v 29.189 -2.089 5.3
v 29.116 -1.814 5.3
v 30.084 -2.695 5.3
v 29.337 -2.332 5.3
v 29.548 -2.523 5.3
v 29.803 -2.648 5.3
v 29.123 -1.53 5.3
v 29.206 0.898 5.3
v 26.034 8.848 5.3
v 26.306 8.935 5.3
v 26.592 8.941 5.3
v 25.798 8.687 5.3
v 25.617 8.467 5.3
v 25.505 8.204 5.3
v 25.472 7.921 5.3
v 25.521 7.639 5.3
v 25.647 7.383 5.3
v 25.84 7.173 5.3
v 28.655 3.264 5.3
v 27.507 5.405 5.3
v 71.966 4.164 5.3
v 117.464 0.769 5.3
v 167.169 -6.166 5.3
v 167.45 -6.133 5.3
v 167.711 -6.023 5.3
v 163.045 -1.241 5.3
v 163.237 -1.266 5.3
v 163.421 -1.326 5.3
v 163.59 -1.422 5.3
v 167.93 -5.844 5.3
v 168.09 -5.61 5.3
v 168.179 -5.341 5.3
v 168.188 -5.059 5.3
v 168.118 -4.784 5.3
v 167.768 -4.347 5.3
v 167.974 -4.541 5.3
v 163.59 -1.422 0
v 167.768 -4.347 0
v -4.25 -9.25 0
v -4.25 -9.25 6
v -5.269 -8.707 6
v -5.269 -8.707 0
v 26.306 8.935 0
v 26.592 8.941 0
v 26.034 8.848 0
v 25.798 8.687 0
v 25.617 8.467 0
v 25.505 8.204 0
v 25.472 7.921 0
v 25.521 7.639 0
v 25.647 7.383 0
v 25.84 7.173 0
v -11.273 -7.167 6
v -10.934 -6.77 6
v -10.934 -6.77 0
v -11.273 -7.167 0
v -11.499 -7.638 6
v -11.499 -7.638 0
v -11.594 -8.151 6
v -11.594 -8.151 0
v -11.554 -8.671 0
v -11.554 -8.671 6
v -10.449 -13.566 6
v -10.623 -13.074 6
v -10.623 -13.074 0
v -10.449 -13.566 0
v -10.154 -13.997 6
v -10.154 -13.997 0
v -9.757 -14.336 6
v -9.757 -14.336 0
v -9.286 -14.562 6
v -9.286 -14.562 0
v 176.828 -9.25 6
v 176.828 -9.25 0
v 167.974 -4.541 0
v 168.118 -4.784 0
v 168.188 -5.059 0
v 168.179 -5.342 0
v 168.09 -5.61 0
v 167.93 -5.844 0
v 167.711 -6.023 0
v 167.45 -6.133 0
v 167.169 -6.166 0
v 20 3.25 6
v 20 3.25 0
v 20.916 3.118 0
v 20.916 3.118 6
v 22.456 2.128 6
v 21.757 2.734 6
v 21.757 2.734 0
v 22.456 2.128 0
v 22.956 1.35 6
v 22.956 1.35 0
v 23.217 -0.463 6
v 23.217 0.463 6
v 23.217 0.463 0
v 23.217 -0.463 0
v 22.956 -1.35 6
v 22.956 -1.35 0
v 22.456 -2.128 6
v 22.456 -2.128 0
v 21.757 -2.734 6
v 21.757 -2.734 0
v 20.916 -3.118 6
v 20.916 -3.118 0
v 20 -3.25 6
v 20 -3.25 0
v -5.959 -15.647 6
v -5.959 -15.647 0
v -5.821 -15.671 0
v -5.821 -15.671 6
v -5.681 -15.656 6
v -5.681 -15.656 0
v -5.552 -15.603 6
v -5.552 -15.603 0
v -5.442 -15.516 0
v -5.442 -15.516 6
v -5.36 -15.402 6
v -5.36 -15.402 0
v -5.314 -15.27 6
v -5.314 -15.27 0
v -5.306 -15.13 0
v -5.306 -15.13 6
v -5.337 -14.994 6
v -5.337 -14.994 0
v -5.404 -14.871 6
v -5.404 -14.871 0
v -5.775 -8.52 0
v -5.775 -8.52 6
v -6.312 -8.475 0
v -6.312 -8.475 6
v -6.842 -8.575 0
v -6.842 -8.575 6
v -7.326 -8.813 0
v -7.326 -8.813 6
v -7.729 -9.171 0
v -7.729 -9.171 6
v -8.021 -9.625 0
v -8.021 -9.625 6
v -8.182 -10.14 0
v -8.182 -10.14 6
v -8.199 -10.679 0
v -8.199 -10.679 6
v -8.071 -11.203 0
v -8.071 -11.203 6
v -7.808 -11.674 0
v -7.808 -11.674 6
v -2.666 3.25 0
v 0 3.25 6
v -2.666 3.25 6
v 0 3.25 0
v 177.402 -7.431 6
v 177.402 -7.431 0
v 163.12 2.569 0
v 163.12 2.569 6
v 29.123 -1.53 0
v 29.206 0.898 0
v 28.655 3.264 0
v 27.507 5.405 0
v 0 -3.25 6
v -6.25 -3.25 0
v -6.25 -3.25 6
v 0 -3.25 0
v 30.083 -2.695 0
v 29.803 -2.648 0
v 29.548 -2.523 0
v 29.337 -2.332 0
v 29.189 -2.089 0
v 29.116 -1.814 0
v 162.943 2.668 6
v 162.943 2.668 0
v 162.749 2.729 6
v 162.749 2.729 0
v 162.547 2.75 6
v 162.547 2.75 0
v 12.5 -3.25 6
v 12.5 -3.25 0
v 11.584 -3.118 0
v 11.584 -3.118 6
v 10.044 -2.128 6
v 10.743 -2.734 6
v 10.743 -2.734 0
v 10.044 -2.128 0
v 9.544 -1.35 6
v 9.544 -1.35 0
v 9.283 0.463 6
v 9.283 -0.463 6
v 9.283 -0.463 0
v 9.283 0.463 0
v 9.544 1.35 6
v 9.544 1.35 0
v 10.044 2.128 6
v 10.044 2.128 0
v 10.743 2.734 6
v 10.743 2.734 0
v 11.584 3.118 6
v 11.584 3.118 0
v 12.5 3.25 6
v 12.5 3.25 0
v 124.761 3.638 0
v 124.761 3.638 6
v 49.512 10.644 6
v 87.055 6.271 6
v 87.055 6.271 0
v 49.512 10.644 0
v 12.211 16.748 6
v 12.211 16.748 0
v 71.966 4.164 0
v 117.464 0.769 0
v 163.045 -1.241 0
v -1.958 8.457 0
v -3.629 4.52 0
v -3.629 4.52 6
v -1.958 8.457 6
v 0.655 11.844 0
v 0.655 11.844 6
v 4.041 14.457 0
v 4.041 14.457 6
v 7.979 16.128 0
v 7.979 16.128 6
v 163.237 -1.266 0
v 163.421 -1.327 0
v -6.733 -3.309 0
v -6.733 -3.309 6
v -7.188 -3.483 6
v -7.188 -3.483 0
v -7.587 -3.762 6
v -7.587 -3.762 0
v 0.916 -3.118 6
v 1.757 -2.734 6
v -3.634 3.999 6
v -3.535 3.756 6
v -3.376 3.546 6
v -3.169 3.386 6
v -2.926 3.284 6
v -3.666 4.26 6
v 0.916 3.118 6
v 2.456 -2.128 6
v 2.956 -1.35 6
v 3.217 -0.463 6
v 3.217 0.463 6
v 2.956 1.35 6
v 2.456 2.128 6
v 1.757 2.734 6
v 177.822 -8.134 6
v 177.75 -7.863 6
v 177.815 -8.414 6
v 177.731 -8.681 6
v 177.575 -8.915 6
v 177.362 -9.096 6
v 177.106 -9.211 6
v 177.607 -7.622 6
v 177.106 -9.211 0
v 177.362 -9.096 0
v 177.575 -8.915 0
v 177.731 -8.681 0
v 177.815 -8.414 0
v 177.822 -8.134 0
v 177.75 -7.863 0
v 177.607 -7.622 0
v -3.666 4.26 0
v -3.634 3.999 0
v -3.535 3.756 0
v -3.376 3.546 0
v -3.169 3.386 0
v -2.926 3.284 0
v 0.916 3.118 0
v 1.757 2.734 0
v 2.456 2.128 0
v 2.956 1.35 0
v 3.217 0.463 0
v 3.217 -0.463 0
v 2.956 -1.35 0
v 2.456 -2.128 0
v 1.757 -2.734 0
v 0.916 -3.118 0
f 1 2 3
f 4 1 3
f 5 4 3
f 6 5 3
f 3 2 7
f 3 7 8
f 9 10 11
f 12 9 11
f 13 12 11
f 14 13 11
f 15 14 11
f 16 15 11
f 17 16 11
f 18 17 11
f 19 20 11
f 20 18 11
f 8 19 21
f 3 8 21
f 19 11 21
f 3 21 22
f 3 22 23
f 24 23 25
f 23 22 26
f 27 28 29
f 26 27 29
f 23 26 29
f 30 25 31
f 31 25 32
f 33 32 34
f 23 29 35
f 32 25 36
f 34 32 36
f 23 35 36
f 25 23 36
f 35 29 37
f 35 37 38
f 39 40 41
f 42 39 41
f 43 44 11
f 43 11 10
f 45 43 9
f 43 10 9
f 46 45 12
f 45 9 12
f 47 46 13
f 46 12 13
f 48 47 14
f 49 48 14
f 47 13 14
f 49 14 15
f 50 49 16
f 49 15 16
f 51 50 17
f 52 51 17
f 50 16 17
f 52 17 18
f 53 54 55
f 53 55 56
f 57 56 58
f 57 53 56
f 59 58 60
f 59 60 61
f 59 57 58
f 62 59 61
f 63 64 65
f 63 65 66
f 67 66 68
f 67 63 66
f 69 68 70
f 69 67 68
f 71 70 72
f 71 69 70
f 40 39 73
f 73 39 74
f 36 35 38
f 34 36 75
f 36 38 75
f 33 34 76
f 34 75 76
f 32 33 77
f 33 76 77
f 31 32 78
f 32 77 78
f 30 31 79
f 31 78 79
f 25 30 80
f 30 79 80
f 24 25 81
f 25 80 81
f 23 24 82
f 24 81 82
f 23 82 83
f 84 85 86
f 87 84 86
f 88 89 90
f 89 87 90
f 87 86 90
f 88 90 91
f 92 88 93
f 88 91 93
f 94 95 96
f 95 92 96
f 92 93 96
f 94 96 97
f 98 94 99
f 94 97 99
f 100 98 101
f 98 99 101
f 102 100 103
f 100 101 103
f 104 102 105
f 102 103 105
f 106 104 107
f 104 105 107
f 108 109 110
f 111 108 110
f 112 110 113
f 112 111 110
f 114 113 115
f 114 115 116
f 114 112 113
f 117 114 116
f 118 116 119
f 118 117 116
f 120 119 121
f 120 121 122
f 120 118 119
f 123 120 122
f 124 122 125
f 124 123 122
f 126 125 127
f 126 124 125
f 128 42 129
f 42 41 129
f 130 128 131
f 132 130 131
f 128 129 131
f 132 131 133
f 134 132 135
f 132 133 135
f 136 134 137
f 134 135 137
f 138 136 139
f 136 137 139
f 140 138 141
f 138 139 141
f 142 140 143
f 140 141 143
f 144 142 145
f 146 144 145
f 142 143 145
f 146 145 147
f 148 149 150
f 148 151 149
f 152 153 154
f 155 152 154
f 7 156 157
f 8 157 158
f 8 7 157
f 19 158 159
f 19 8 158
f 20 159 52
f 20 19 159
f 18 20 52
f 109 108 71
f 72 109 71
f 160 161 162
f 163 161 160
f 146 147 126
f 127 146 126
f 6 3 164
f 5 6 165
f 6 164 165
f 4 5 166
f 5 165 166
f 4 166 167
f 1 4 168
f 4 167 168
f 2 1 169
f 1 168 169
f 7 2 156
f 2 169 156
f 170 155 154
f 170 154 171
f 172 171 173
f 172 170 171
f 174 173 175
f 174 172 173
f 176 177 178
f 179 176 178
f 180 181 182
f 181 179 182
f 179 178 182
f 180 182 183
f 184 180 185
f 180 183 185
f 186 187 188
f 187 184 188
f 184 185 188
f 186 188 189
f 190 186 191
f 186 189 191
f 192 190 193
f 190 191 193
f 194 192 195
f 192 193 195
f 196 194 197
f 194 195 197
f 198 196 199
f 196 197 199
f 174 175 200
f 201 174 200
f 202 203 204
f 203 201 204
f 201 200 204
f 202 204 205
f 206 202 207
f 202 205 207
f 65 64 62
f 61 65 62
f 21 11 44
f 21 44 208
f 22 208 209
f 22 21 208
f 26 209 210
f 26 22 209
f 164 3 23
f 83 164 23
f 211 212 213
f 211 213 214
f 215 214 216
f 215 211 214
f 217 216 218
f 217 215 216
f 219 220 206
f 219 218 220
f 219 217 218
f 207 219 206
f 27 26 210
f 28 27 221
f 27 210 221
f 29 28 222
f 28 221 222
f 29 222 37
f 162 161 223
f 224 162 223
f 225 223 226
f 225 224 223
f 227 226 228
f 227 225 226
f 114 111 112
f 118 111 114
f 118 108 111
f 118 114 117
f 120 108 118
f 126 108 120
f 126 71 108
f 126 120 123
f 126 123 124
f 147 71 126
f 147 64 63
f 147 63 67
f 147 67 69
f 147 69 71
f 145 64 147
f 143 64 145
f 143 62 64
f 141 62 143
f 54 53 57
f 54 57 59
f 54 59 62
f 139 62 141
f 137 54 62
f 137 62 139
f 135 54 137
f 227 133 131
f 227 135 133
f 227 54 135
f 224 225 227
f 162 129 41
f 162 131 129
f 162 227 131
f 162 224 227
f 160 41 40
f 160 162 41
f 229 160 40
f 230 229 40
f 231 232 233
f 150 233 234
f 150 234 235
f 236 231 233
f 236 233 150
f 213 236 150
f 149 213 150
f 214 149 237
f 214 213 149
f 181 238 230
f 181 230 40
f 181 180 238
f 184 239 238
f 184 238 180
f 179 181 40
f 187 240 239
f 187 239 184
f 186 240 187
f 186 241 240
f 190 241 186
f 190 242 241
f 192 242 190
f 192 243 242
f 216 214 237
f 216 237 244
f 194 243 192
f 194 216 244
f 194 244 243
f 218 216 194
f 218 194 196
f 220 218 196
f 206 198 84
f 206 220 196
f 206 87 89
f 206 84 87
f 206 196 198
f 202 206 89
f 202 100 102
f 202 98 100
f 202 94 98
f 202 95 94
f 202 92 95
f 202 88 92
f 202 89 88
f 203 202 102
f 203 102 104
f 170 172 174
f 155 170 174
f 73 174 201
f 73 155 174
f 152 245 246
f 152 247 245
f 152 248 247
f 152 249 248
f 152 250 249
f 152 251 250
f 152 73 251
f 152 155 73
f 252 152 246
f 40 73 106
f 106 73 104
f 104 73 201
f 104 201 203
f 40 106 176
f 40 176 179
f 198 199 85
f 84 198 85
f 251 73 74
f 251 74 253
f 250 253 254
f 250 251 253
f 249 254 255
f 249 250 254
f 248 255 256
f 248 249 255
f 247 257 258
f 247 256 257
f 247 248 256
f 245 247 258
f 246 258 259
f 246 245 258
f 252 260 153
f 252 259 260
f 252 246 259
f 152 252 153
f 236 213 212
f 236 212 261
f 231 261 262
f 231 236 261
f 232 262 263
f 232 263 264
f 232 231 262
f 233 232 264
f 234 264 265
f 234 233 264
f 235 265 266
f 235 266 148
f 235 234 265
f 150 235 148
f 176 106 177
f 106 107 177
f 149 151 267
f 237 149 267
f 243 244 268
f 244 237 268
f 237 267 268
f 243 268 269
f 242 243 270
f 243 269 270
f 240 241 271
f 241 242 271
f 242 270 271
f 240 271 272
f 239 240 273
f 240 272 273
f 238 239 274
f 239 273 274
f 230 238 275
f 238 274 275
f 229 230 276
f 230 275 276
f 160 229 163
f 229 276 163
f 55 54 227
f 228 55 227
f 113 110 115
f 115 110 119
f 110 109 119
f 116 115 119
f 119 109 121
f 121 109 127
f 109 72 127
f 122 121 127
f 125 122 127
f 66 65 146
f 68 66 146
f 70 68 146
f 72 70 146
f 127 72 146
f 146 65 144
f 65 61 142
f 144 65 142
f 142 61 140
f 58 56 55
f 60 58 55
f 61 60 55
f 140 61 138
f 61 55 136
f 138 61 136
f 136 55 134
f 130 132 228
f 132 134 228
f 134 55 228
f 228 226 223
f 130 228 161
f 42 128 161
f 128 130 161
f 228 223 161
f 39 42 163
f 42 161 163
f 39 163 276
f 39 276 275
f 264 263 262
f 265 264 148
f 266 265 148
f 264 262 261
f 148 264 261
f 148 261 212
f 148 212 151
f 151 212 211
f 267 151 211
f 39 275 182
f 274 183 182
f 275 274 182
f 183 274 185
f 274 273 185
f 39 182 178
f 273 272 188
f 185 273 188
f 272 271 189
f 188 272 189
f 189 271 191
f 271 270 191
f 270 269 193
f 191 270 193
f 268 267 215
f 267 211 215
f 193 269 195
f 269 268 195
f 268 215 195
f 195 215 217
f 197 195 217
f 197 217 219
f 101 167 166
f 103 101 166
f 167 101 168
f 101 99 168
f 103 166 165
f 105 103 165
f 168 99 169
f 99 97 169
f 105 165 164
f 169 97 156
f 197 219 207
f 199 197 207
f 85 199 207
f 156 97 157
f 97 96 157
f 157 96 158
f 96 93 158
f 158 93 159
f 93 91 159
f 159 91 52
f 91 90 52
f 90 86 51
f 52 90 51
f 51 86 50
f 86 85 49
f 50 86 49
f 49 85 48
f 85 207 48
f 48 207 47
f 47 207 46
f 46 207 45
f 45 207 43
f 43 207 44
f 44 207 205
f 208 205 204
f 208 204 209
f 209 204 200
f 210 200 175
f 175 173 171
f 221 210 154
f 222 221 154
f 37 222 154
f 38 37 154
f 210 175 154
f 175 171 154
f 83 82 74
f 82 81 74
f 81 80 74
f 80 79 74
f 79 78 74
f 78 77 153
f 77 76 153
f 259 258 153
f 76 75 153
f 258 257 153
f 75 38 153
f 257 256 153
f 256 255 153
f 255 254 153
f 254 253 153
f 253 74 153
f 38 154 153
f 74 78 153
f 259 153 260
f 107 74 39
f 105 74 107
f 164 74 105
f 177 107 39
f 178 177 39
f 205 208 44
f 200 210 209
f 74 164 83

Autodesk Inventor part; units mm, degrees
ref_plane "YZ Plane" through (0, 0, 0) normal (1, 0, 0) x (0, 1, 0)
ref_plane "XZ Plane" through (0, 0, 0) normal (0, 1, 0) x (-1, 0, 0)
ref_plane "XY Plane" through (0, 0, 0) normal (0, 0, 1) x (1, 0, 0)
sketch "スケッチ4" plane through (0, 0, 0) normal (0, 0, 1) x (1, 0, 0)
  arc A0 (0, -3.25) -> (0, 3.25) centre (0, 0) ccw
  circle A1 centre (-7.5, 0) radius 3.25 construction
  arc A2 (12.5, 3.25) -> (12.5, -3.25) centre (12.5, 0) ccw
  arc A3 (20, -3.25) -> (20, 3.25) centre (20, 0) ccw
  arc A4 (12.5, 20) -> (-7.5, 0) centre (12.5, 0) ccw construction
  line L0 (12.5, 3.25) -> (20, 3.25)
  line L1 (20, -3.25) -> (12.5, -3.25)
  arc A5 (12.5, 16.75) -> (12.211, 16.7475) centre (12.5, 0) ccw construction
  circle A6 centre (12.5, 20) radius 3.25 construction
  line L2 (0, 3.25) -> (-3.9317, 3.25)
  line L3 (-7.5, -3.25) -> (-4.25, -3.25) construction
  line L4 (20, 9.25) -> (12.5, 9.25)
  arc A7 (12.5, 9.25) -> (12.5, -9.25) centre (12.5, 0) ccw construction
  line L5 (12.5, -9.25) -> (20, -9.25)
  arc A8 (20, -9.25) -> (20, 9.25) centre (20, 0) ccw
  line L6 (-3.9317, 3.25) -> (-7.5, 3.25) construction
  line L7 (-4.25, 0) -> (-4.25, -3.25) construction
  line L8 (-4.25, -3.25) -> (0, -3.25)
  arc A9 (-3.9317, 3.25) -> (-4.25, 0) centre (12.5, 0) ccw construction
  line L9 (-4.25, -3.25) -> (-4.25, -9.25)
  line L10 (-4.25, -9.25) -> (12.5, -9.25)
  line L11 (20, -9.25) -> (180, -9.25)
  line L12 (180, -9.25) -> (162.8622, 2.75)
  line L13 (162.8622, 2.75) -> (162.8622, -9.25) construction
  arc A10 (11.9, 16.8059) -> (12.211, 16.7475) centre (162.8622, 820.4571) ccw construction
  arc A11 (12.211, 16.7475) -> (162.8622, 2.75) centre (162.8622, 820.4571) ccw
  arc A12 (12.211, 16.7475) -> (-3.9317, 3.25) centre (12.5, 0) ccw
  dimension "d39" = 6.5
  dimension "d40" = 6.5
  dimension "d41" = 6.5
  dimension "d42" = 6.5
  dimension "d43" = 7.5
  dimension "d44" = 7.5
  dimension "d46" = 20
  dimension "d47" = 6
  dimension "d48" = 160
  dimension "d49" = 35
  dimension "d50" = 12
extrude "押し出し3" add sketch "スケッチ4" along normal blind 6
sketch "スケッチ5" plane through (0, 0, 6) normal (0, 0, 1) x (1, 0, 0)
  line L0 (-4.25, -9.25) -> (-5.2687, -8.707)
  line L1 (-7.8081, -11.6738) -> (-5.4042, -14.8709)
  arc A0 (-10.6231, -13.074) -> (-9.2864, -14.5617) centre (-8.6663, -12.6602) ccw
  arc A1 (-5.9588, -15.6467) -> (-5.4042, -14.8709) centre (-5.8038, -15.1714) ccw
  line L2 (-5.9588, -15.6467) -> (-9.2864, -14.5617)
  arc A2 (-10.934, -6.7699) -> (-11.554, -8.6713) centre (-9.5973, -8.2576) ccw
  line L3 (-10.6231, -13.074) -> (-11.554, -8.6713)
  line L4 (-10.934, -6.7699) -> (-7.5867, -3.7623)
  arc A3 (-5.2687, -8.707) -> (-7.8081, -11.6738) centre (-6.2095, -10.4719) ccw
  arc A4 (-6.25, -3.25) -> (-7.5867, -3.7623) centre (-6.25, -5.25) ccw
  line L5 (-6.25, -3.25) -> (-4.25, -3.25)
  line L6 (-4.25, -3.25) -> (-4.25, -9.25)
  line L7 (-4.25, -3.25) -> (-4.25, -9.25) projected
  line L8 (0, -3.25) -> (-4.25, -3.25) projected
  point P0 (0, 0)
  dimension "d54" = 2
  dimension "d55" = 2
  dimension "d56" = 4.5
  dimension "d57" = 2
  dimension "d58" = 4.5
  dimension "d59" = 2
  dimension "d60" = 3.5
  dimension "d61" = 0.5
  dimension "d62" = 4
  dimension "d63" = 2
  dimension "d65" = 25
  dimension "d66" = 35
  dimension "d67" = 120
  dimension "d68" = 120
  dimension "d97" = 1.1544
  dimension "d98" = 61.94
extrude "押し出し4" add sketch "スケッチ5" against normal blind 6
fillet "フィレット2" radius 1 2 edges at (162.8622, 2.75, 3) (180, -9.25, 3)
sketch "スケッチ6" plane through (0, 0, 6) normal (0, 0, 1) x (1, 0, 0)
  arc A0 (12.211, 16.7475) -> (162.5472, 2.7501) centre (162.8622, 820.4571) ccw projected
  line L0 (-4.25, -9.25) -> (176.8284, -9.25) projected
  arc A1 (20, -3.25) -> (20, 3.25) centre (20, 0) ccw projected
  line L1 (12.5, 3.25) -> (20, 3.25) projected
  line L2 (20, -3.25) -> (12.5, -3.25) projected
  line L3 (177.402, -7.4308) -> (163.1204, 2.5692) projected
  arc A2 (176.8284, -9.25) -> (177.402, -7.4308) centre (176.8284, -8.25) ccw projected
  arc A3 (163.1204, 2.5692) -> (162.5472, 2.7501) centre (162.5468, 1.7501) ccw projected
  line L4 (163.3443, -1.2499) -> (170.4852, -6.25)
  arc A4 (12.211, 10.7475) -> (26.5915, 8.9414) centre (206.3266, 1498.1342) ccw construction
  line L5 (12.5, -2.25) -> (28.858, -2.6642) construction
  line L6 (163.3443, -1.2499) -> (163.3443, 2.7501)
  line L7 (12.5, 9.25) -> (20, 9.25) construction
  arc A5 (20, -9.25) -> (28.858, -2.6642) centre (20, 0) ccw construction
  line L8 (20, -9.25) -> (12.5, -9.25)
  arc A6 (26.5915, 8.9414) -> (25.8403, 7.1731) centre (26.4717, 7.9486) ccw
  arc A7 (28.858, -2.6642) -> (25.8403, 7.1731) centre (20, 0) ccw
  line L9 (28.858, -2.6642) -> (170.4852, -6.25)
  arc A8 (26.5915, 8.9414) -> (163.3443, -1.2499) centre (206.3266, 1498.1342) ccw
  arc A9 (25.8403, 7.1731) -> (20, 9.25) centre (20, 0) ccw construction
  point P0 (0, 0)
  dimension "d73" = 3
  dimension "d74" = 6
  dimension "d75" = 7
  dimension "d76" = 4
  dimension "d77" = 3
  dimension "d80" = 1500
  dimension "d81" = 6
  dimension "d82" = 2
extrude "押し出し5" cut sketch "スケッチ6" against normal blind 6
fillet "フィレット3" radius 1 3 edges at (163.3443, -1.2499, 3) (28.858, -2.6642, 3) (170.4852, -6.25, 3)
sketch "スケッチ8" plane through (0, 0, 6) normal (0, 0, 1) x (1, 0, 0)
  arc A0 (26.5915, 8.9414) -> (163.0449, -1.2412) centre (206.3266, 1498.1342) ccw projected
  arc A1 (163.5897, -1.4217) -> (163.0449, -1.2412) centre (163.0161, -2.2408) ccw projected
  line L0 (163.5897, -1.4217) -> (167.7677, -4.3472) projected
  arc A2 (167.1689, -6.166) -> (167.7677, -4.3472) centre (167.1942, -5.1664) ccw projected
  line L1 (167.1689, -6.166) -> (30.0835, -2.6952) projected
  arc A3 (29.1226, -1.5301) -> (30.0835, -2.6952) centre (30.1088, -1.6955) ccw projected
  arc A4 (29.1226, -1.5301) -> (25.8403, 7.1731) centre (20, 0) ccw projected
  arc A5 (26.5915, 8.9414) -> (25.8403, 7.1731) centre (26.4717, 7.9486) ccw projected
  arc A6 (176.8284, -9.25) -> (177.402, -7.4308) centre (176.8284, -8.25) ccw projected
  line L2 (177.402, -7.4308) -> (163.1204, 2.5692) projected
  arc A7 (163.1204, 2.5692) -> (162.5472, 2.7501) centre (162.5468, 1.7501) ccw projected
  arc A8 (12.211, 16.7475) -> (162.5472, 2.7501) centre (162.8622, 820.4571) ccw projected
  arc A9 (12.211, 16.7475) -> (-3.9317, 3.25) centre (12.5, 0) ccw projected
  line L3 (-3.9317, 3.25) -> (0, 3.25) projected
  arc A10 (0, -3.25) -> (0, 3.25) centre (0, 0) ccw projected
  arc A11 (-6.25, -3.25) -> (-7.5867, -3.7623) centre (-6.25, -5.25) ccw projected
  line L4 (-7.5867, -3.7623) -> (-10.934, -6.7699) projected
  arc A12 (-10.934, -6.7699) -> (-11.554, -8.6713) centre (-9.5973, -8.2576) ccw projected
  line L5 (-11.554, -8.6713) -> (-10.6231, -13.074) projected
  arc A13 (-10.6231, -13.074) -> (-9.2864, -14.5617) centre (-8.6663, -12.6602) ccw projected
  line L6 (-9.2864, -14.5617) -> (-5.9588, -15.6467) projected
  arc A14 (-5.9588, -15.6467) -> (-5.4042, -14.8709) centre (-5.8038, -15.1714) ccw projected
  line L7 (-5.4042, -14.8709) -> (-7.8081, -11.6738) projected
  arc A15 (-5.2687, -8.707) -> (-7.8081, -11.6738) centre (-6.2095, -10.4719) ccw projected
  line L8 (-5.2687, -8.707) -> (-4.25, -9.25) projected
  line L9 (-4.25, -9.25) -> (176.8284, -9.25) projected
  line L10 (12.5, 3.25) -> (20, 3.25) projected
  arc A16 (20, -3.25) -> (20, 3.25) centre (20, 0) ccw projected
  line L11 (20, -3.25) -> (12.5, -3.25) projected
  arc A17 (12.5, 3.25) -> (12.5, -3.25) centre (12.5, 0) ccw projected
  line L12 (0, -3.25) -> (-6.25, -3.25) projected
extrude "押し出し6" add sketch "スケッチ8" against normal blind 0.7 contours A0 A1 L0 A2 L1 A3 A4 A5
fillet "フィレット5" radius 1 1 edges at (-3.9317, 3.25, 3)
equation "\"d44\" = d43"
properties part number "ウイング1" material "ポリカーボネート、クリア"
